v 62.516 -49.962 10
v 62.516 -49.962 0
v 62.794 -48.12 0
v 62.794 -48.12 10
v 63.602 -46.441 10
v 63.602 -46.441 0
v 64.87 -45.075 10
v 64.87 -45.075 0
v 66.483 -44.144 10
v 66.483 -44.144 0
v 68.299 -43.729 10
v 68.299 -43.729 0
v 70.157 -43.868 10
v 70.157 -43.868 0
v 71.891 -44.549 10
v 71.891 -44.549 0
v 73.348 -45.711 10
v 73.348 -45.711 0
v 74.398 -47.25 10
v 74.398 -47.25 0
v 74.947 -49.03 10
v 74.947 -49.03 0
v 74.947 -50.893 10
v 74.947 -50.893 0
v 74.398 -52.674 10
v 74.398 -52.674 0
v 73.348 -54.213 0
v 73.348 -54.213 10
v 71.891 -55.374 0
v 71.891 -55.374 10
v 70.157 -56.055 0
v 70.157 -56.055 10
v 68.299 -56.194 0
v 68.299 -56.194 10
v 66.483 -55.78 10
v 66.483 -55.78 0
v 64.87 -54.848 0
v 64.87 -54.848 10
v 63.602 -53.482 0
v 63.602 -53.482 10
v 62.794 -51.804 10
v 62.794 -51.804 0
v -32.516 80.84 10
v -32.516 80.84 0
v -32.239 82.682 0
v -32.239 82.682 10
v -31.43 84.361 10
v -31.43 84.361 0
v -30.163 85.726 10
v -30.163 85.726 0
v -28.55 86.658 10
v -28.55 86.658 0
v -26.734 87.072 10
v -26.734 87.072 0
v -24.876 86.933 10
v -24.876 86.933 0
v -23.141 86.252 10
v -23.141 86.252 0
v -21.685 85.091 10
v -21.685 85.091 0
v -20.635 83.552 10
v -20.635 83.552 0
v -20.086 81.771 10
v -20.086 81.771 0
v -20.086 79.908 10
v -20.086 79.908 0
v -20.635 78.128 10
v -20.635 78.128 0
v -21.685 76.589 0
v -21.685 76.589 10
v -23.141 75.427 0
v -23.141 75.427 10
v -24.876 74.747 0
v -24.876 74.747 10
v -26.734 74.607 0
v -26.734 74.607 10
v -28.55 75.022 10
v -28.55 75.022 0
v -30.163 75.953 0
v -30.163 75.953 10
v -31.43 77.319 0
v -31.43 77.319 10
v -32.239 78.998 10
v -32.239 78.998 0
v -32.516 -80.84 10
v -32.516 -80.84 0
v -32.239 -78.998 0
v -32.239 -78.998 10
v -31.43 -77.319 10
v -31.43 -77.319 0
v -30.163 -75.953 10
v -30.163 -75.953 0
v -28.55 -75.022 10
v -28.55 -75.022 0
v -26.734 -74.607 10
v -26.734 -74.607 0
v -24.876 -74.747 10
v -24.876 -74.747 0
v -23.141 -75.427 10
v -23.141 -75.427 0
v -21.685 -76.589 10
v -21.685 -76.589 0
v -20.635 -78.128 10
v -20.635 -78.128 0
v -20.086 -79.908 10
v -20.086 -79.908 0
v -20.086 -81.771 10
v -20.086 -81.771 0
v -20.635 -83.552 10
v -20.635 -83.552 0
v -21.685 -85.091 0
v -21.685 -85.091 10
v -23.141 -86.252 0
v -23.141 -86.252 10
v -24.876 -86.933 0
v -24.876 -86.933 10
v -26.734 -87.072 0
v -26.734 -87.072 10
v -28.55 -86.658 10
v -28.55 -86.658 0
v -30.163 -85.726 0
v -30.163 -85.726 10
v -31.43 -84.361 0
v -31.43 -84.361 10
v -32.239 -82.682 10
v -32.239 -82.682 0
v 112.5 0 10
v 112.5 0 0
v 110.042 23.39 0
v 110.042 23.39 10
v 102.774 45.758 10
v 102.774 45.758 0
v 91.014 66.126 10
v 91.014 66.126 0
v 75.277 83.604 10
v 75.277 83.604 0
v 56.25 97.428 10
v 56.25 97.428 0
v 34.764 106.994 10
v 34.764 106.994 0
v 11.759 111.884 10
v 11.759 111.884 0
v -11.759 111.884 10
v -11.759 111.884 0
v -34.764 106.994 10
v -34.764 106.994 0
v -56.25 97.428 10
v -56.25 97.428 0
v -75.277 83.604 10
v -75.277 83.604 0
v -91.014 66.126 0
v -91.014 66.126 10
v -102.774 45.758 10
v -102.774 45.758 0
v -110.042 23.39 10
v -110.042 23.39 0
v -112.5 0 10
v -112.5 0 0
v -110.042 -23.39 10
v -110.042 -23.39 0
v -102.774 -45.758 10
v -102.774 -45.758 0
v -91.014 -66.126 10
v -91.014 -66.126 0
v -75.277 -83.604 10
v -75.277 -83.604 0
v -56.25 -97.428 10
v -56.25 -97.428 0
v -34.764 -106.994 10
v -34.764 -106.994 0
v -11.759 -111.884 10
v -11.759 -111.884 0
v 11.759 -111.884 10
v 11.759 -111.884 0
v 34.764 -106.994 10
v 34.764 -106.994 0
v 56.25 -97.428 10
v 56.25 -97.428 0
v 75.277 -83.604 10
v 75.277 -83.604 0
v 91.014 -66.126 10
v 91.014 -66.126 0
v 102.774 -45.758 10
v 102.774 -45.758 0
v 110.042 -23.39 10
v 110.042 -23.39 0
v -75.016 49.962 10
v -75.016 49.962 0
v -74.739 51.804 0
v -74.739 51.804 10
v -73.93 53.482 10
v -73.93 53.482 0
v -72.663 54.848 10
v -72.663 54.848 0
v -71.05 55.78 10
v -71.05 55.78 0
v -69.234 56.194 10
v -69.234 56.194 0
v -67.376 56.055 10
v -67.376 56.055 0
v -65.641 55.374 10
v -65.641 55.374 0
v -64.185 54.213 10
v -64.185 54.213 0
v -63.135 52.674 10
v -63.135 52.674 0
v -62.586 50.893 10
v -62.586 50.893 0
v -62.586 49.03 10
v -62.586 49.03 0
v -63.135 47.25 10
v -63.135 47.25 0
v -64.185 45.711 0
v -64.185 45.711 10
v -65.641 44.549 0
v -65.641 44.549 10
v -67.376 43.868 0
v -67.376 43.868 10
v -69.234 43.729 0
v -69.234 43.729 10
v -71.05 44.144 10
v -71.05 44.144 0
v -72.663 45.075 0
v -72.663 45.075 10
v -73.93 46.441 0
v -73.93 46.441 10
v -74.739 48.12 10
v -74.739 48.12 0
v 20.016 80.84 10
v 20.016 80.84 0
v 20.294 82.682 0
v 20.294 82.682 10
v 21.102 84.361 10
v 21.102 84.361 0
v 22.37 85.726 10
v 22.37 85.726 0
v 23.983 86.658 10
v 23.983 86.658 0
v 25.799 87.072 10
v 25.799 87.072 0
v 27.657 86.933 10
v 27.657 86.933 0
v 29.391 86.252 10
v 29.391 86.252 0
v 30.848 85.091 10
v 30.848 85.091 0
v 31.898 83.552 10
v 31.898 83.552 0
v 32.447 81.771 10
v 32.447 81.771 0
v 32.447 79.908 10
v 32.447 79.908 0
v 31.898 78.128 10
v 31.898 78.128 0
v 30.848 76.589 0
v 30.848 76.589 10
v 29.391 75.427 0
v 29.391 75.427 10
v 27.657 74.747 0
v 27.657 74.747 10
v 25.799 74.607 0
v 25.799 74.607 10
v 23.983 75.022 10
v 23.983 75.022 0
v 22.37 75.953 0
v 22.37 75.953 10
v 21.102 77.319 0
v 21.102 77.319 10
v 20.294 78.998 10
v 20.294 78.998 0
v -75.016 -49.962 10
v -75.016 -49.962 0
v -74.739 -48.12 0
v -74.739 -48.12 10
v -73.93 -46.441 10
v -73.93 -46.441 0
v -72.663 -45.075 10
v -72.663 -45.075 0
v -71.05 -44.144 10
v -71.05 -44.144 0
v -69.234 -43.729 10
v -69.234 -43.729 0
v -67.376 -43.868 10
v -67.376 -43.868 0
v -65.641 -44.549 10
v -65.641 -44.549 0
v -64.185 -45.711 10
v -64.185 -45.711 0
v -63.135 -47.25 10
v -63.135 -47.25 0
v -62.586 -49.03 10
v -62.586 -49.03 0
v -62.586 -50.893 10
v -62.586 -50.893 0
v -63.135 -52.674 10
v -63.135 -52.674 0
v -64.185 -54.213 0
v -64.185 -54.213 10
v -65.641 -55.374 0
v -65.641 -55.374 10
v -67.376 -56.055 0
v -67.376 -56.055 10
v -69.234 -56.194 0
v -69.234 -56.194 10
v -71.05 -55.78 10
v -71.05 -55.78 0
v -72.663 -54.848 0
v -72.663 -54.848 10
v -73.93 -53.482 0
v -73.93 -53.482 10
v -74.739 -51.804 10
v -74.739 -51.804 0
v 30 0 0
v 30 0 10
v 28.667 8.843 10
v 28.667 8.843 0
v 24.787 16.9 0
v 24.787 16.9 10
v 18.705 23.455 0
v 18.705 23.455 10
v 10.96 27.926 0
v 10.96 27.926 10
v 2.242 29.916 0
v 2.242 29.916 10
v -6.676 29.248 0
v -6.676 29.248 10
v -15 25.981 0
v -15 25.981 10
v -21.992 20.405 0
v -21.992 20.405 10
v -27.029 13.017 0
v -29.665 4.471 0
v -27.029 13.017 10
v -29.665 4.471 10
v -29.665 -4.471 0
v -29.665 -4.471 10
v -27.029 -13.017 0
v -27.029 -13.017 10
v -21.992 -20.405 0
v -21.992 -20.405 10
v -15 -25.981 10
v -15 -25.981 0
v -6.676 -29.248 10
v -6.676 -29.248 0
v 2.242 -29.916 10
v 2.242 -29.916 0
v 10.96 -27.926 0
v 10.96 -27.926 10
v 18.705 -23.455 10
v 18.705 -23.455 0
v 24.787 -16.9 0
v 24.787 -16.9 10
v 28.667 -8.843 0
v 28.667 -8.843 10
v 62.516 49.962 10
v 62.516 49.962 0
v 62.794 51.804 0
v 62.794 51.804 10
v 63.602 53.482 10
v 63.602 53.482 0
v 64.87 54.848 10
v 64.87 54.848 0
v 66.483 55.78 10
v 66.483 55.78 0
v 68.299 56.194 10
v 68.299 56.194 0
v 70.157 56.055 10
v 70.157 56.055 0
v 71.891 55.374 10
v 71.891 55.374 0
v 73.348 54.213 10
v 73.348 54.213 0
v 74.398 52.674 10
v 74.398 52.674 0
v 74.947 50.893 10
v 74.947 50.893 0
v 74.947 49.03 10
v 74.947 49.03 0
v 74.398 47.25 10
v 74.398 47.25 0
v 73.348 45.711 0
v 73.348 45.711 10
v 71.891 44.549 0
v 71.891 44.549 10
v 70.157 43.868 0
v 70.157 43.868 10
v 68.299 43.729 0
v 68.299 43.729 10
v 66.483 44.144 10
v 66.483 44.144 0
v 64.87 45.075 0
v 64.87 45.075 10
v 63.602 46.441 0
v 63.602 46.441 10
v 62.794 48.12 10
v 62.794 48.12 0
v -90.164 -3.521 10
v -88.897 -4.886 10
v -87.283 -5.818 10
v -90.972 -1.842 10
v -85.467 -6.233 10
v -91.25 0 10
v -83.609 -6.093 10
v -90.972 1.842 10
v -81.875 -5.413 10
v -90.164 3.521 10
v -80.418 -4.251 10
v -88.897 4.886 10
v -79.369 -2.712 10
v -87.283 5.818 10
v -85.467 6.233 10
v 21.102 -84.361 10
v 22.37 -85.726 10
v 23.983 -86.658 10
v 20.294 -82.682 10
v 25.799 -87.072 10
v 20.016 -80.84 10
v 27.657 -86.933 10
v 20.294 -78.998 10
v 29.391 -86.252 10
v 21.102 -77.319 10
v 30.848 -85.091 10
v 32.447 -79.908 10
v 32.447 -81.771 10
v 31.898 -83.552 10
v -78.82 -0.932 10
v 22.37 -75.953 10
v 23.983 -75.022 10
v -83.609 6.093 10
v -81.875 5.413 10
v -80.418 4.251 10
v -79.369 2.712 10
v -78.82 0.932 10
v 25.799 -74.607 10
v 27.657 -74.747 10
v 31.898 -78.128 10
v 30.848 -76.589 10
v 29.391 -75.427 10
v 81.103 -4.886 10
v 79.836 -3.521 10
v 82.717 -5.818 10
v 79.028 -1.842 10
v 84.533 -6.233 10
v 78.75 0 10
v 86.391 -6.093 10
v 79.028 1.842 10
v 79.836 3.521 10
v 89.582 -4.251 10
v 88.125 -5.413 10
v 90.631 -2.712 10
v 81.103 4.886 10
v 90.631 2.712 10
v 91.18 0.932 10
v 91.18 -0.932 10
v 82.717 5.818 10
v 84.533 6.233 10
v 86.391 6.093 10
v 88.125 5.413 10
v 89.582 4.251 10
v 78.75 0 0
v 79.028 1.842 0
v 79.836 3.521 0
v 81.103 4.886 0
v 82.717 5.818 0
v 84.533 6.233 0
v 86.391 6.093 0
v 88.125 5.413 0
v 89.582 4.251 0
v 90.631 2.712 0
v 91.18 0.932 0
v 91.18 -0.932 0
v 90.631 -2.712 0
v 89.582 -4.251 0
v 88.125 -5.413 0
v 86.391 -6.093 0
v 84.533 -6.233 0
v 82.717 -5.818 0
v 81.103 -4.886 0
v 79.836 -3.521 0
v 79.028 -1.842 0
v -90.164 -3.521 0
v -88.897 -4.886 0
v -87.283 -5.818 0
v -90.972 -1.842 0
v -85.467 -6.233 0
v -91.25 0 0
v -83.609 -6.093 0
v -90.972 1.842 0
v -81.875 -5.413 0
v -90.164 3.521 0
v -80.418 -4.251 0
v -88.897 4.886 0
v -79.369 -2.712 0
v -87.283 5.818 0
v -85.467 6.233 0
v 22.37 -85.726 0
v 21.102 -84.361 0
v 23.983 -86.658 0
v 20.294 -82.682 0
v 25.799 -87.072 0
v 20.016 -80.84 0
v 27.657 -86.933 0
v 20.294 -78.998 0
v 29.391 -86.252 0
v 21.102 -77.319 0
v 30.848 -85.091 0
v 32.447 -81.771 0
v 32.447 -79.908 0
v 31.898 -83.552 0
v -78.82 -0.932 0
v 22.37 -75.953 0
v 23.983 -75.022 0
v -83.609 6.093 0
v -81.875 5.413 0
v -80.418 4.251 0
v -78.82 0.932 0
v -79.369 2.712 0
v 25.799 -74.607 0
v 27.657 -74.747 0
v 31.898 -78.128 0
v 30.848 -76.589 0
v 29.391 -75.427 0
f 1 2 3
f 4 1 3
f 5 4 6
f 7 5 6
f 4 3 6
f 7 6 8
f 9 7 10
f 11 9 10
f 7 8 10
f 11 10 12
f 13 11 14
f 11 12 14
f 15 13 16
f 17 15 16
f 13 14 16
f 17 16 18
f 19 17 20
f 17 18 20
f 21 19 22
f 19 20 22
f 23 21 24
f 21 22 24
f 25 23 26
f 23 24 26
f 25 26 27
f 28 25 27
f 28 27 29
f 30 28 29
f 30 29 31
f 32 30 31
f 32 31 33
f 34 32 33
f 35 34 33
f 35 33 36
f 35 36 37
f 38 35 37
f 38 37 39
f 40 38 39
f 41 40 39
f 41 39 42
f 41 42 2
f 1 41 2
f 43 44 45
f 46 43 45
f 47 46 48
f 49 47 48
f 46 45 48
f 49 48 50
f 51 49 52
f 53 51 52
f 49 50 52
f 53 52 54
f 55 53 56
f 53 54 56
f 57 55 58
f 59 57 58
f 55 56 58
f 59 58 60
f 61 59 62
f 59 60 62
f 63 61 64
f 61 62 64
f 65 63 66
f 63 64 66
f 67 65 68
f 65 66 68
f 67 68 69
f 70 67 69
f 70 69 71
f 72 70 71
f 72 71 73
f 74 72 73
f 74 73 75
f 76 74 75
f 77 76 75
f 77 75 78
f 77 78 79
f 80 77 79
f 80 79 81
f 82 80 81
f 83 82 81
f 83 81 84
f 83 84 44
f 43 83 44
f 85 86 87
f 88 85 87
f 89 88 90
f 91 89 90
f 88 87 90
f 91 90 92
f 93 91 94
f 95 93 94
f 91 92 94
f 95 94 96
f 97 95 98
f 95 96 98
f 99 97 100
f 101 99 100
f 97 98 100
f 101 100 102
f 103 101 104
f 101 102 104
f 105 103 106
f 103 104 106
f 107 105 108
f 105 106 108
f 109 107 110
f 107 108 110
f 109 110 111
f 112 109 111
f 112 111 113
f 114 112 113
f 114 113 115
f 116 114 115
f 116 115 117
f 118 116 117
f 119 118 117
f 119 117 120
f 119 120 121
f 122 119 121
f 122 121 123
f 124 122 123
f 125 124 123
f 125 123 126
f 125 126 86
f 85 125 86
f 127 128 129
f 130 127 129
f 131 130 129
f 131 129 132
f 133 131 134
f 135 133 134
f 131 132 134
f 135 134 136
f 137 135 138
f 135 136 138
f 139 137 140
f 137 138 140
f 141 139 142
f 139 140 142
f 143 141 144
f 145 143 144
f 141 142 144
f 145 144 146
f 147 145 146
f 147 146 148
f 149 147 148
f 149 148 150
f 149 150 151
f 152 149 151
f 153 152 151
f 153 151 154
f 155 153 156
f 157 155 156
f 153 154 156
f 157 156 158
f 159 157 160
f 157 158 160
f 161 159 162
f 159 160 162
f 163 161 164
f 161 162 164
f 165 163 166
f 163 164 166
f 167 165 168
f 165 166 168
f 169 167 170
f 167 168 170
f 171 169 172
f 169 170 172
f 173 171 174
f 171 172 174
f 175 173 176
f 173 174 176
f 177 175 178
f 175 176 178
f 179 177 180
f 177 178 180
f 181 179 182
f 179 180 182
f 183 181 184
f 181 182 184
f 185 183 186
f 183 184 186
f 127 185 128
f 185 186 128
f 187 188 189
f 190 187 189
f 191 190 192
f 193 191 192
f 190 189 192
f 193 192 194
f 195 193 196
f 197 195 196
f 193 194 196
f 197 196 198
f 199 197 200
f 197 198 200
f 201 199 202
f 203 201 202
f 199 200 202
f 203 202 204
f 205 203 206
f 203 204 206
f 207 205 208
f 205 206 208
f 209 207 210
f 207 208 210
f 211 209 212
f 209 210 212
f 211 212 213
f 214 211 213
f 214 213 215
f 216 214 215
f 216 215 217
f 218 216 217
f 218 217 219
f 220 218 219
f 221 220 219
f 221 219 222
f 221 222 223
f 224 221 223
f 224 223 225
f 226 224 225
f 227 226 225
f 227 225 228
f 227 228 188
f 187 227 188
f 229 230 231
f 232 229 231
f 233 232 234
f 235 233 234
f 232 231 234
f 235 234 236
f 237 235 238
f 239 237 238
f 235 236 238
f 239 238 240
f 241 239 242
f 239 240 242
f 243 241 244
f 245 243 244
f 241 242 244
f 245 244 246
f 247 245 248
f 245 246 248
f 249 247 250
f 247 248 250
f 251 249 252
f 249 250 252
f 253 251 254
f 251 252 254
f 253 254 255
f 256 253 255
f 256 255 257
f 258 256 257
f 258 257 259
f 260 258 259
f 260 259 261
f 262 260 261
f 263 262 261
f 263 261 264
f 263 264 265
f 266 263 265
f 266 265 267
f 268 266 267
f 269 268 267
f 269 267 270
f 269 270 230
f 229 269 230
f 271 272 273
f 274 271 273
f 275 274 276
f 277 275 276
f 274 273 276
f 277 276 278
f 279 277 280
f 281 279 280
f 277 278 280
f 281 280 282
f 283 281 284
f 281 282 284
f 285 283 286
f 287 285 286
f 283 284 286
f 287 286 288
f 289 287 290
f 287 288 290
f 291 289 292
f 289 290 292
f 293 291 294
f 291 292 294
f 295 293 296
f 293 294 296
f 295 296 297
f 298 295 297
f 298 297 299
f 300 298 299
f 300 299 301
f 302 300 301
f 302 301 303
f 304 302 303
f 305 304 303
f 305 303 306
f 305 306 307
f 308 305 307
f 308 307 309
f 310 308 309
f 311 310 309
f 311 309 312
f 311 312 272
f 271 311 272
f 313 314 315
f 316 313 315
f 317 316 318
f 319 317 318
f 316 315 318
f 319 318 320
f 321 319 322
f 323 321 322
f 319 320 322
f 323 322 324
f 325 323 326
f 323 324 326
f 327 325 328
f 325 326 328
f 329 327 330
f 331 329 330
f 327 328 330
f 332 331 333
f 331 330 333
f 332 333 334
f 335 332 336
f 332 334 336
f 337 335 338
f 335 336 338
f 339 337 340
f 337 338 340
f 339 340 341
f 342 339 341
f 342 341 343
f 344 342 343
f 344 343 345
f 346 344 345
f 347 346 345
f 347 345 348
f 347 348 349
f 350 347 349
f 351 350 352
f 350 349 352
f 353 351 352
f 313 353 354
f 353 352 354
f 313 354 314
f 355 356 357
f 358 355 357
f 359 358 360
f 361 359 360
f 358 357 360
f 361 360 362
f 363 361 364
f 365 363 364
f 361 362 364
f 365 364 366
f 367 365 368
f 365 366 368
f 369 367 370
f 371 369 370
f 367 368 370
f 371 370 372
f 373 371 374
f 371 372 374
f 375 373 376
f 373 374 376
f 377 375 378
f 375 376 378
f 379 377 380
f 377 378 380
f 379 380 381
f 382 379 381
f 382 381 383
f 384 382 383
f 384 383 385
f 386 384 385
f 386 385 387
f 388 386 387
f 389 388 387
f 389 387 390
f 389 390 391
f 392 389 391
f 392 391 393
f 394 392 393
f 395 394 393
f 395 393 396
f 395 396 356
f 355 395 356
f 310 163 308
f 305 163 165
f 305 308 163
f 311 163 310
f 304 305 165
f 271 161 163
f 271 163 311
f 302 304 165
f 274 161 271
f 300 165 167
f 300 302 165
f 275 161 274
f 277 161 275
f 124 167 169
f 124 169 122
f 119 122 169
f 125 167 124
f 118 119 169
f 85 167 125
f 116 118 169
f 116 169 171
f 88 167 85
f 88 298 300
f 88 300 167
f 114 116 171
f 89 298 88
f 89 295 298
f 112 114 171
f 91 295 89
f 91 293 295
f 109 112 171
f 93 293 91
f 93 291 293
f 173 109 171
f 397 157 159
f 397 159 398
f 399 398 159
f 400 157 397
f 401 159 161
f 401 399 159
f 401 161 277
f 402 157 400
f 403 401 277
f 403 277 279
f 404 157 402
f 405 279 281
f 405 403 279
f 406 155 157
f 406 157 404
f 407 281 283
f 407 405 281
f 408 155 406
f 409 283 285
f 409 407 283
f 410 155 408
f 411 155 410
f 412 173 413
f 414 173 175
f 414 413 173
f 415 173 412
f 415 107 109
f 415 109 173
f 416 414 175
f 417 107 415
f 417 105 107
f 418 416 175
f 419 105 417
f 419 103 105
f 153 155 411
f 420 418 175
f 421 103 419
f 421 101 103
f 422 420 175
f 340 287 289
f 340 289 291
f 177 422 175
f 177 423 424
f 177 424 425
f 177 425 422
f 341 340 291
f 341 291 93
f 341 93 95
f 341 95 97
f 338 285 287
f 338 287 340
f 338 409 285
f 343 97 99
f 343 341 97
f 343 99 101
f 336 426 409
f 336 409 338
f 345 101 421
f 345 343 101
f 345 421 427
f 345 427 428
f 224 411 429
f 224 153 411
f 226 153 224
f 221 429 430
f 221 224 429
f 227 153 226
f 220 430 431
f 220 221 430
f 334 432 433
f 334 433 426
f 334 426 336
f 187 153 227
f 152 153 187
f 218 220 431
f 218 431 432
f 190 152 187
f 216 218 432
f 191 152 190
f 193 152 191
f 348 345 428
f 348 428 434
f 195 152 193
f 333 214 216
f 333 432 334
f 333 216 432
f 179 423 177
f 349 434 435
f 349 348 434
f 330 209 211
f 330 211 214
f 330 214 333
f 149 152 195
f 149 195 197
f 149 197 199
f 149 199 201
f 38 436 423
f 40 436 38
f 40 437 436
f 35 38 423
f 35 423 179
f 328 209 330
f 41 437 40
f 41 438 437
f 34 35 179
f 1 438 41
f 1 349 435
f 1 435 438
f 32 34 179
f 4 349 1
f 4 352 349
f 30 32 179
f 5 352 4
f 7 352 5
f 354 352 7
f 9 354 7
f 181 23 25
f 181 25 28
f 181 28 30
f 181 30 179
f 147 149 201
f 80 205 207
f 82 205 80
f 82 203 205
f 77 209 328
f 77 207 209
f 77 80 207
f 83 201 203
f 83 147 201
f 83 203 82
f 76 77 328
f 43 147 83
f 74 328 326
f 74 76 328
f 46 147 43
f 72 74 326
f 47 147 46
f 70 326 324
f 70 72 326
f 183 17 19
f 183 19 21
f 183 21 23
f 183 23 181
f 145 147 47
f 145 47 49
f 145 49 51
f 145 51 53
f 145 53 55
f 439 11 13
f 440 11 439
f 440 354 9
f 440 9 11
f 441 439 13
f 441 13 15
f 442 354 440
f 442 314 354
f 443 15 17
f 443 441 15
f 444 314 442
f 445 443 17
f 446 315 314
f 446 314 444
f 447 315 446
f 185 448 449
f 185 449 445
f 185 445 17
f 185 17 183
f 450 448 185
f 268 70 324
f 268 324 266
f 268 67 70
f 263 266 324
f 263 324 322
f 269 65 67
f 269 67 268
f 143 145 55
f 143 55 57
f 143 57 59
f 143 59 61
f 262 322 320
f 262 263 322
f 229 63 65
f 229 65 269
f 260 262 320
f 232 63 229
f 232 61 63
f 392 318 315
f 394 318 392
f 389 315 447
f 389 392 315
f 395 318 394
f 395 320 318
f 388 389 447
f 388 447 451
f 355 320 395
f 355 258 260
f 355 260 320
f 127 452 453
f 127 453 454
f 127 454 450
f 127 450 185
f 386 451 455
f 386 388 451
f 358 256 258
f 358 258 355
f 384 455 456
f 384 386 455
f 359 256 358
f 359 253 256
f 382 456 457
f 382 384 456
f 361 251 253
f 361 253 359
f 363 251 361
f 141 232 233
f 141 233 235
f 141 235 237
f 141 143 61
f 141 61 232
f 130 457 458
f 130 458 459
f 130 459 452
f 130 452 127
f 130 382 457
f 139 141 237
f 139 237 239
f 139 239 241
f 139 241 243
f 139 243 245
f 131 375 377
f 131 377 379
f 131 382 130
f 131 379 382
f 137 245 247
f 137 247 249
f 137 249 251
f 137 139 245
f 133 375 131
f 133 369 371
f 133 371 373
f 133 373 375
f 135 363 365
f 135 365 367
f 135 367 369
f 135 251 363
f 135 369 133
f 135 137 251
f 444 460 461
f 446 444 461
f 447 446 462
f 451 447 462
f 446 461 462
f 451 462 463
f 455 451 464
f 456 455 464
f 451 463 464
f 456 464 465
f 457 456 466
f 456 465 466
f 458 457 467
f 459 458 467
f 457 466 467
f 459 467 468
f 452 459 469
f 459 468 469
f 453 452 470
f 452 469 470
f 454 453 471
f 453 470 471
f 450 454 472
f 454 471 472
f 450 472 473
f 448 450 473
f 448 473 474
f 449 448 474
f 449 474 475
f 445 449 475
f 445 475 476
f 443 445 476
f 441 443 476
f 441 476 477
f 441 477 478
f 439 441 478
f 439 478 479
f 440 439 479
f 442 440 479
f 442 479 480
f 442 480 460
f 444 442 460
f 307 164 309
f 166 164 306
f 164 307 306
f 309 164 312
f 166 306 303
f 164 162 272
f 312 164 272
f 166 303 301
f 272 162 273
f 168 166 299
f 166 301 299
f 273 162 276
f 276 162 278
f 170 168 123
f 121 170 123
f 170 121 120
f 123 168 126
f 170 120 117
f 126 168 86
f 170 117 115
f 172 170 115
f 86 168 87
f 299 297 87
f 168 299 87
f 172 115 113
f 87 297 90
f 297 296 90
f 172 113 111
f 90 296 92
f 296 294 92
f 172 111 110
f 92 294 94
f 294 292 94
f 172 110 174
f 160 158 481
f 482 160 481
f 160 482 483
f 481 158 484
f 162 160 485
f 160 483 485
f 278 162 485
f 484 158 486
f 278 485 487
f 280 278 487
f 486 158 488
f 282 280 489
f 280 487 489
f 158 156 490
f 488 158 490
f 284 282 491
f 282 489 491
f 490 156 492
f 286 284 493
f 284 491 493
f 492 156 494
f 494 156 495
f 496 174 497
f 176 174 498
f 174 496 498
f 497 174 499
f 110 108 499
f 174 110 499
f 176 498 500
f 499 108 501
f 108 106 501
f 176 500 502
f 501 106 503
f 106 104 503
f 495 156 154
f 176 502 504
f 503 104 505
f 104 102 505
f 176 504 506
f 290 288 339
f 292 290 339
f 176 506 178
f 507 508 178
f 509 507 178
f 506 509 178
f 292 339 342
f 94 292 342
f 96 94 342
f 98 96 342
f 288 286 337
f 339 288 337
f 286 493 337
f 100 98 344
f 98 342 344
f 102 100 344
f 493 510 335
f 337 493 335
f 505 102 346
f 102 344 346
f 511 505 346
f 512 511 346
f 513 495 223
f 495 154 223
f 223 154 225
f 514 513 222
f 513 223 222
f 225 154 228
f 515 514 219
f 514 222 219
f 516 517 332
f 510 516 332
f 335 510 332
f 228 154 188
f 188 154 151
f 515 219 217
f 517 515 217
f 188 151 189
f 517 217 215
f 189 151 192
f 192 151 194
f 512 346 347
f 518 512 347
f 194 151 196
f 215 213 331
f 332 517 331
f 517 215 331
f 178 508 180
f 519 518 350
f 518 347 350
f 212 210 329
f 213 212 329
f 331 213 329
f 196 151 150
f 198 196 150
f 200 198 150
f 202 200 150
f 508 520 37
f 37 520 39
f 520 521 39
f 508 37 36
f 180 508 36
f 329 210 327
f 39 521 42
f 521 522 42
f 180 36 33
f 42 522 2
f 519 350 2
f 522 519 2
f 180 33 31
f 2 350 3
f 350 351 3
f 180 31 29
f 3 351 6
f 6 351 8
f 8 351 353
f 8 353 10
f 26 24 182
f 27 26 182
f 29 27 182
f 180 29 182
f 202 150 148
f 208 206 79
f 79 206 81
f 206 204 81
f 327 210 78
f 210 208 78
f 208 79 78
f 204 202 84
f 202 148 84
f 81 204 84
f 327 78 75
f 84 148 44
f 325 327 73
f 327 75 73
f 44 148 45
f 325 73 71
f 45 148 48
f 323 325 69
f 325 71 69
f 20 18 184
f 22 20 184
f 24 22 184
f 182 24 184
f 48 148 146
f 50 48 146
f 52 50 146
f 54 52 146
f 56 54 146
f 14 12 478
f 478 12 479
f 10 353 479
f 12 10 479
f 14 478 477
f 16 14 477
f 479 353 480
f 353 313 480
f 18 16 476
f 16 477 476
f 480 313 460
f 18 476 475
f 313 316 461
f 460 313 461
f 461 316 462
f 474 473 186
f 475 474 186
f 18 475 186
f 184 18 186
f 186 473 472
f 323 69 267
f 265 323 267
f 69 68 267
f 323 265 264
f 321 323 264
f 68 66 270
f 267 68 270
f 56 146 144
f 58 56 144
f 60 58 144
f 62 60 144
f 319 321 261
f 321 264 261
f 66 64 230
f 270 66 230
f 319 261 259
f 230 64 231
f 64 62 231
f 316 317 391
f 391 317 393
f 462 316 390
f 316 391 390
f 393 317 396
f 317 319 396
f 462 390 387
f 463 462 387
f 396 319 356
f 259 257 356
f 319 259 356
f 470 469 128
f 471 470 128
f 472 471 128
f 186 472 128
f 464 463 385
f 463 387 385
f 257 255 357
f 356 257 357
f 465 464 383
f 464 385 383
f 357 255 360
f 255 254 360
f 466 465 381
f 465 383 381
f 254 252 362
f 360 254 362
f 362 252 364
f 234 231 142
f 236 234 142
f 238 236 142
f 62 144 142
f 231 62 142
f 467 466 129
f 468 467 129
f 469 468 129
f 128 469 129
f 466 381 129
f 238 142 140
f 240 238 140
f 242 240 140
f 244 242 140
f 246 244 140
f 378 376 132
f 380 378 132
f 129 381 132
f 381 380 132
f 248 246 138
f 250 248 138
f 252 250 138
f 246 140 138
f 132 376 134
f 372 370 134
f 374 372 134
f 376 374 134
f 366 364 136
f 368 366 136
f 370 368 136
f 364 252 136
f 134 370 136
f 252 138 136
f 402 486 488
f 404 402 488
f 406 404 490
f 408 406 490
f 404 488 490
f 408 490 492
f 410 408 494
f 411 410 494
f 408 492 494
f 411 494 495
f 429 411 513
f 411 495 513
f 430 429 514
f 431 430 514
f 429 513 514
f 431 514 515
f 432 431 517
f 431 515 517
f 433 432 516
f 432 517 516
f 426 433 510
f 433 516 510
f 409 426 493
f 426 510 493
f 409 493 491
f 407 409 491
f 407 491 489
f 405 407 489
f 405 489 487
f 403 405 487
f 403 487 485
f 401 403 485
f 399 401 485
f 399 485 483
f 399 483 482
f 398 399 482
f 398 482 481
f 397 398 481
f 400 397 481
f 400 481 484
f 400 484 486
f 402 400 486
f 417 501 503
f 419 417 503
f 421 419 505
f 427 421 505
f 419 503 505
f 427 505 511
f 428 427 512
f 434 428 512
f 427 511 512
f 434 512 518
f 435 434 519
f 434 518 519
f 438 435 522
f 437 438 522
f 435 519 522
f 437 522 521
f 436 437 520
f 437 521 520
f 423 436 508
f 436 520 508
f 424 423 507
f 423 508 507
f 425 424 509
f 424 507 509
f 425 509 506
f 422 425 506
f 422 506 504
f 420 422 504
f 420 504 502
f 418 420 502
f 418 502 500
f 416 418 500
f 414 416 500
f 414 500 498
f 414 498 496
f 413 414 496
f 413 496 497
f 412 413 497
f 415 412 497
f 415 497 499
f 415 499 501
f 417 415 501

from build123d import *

# Parameters (mm, degrees)
F0_R     = 112.5
F1_DEPTH = 10
F2_R     = 30
F3_DEPTH = 10
F5_D     = 12.5


with BuildPart() as f1:
    # F0 (on Top) → F1 (new body)
    with BuildSketch(Plane.XY):
        Circle(F0_R)
    extrude(amount=F1_DEPTH)

    # F2 (on face) → F3 (cut, through all)
    with BuildSketch(Plane.XY.offset(10)):
        Circle(F2_R)
    extrude(amount=-F3_DEPTH, mode=Mode.SUBTRACT)

    # F5 (through all)
    with Locations(Plane.XY.offset(10)):
        with Locations((85, 0), (68.766445, -49.961746), (68.766445, 49.961746), (26.266445, 80.839804), (-26.266445, 80.839804), (-68.766445, 49.961746), (-85, 0), (-68.766445, -49.961746), (-26.266445, -80.839804), (26.266445, -80.839804)):
            Hole(F5_D / 2)


solid = f1.part
